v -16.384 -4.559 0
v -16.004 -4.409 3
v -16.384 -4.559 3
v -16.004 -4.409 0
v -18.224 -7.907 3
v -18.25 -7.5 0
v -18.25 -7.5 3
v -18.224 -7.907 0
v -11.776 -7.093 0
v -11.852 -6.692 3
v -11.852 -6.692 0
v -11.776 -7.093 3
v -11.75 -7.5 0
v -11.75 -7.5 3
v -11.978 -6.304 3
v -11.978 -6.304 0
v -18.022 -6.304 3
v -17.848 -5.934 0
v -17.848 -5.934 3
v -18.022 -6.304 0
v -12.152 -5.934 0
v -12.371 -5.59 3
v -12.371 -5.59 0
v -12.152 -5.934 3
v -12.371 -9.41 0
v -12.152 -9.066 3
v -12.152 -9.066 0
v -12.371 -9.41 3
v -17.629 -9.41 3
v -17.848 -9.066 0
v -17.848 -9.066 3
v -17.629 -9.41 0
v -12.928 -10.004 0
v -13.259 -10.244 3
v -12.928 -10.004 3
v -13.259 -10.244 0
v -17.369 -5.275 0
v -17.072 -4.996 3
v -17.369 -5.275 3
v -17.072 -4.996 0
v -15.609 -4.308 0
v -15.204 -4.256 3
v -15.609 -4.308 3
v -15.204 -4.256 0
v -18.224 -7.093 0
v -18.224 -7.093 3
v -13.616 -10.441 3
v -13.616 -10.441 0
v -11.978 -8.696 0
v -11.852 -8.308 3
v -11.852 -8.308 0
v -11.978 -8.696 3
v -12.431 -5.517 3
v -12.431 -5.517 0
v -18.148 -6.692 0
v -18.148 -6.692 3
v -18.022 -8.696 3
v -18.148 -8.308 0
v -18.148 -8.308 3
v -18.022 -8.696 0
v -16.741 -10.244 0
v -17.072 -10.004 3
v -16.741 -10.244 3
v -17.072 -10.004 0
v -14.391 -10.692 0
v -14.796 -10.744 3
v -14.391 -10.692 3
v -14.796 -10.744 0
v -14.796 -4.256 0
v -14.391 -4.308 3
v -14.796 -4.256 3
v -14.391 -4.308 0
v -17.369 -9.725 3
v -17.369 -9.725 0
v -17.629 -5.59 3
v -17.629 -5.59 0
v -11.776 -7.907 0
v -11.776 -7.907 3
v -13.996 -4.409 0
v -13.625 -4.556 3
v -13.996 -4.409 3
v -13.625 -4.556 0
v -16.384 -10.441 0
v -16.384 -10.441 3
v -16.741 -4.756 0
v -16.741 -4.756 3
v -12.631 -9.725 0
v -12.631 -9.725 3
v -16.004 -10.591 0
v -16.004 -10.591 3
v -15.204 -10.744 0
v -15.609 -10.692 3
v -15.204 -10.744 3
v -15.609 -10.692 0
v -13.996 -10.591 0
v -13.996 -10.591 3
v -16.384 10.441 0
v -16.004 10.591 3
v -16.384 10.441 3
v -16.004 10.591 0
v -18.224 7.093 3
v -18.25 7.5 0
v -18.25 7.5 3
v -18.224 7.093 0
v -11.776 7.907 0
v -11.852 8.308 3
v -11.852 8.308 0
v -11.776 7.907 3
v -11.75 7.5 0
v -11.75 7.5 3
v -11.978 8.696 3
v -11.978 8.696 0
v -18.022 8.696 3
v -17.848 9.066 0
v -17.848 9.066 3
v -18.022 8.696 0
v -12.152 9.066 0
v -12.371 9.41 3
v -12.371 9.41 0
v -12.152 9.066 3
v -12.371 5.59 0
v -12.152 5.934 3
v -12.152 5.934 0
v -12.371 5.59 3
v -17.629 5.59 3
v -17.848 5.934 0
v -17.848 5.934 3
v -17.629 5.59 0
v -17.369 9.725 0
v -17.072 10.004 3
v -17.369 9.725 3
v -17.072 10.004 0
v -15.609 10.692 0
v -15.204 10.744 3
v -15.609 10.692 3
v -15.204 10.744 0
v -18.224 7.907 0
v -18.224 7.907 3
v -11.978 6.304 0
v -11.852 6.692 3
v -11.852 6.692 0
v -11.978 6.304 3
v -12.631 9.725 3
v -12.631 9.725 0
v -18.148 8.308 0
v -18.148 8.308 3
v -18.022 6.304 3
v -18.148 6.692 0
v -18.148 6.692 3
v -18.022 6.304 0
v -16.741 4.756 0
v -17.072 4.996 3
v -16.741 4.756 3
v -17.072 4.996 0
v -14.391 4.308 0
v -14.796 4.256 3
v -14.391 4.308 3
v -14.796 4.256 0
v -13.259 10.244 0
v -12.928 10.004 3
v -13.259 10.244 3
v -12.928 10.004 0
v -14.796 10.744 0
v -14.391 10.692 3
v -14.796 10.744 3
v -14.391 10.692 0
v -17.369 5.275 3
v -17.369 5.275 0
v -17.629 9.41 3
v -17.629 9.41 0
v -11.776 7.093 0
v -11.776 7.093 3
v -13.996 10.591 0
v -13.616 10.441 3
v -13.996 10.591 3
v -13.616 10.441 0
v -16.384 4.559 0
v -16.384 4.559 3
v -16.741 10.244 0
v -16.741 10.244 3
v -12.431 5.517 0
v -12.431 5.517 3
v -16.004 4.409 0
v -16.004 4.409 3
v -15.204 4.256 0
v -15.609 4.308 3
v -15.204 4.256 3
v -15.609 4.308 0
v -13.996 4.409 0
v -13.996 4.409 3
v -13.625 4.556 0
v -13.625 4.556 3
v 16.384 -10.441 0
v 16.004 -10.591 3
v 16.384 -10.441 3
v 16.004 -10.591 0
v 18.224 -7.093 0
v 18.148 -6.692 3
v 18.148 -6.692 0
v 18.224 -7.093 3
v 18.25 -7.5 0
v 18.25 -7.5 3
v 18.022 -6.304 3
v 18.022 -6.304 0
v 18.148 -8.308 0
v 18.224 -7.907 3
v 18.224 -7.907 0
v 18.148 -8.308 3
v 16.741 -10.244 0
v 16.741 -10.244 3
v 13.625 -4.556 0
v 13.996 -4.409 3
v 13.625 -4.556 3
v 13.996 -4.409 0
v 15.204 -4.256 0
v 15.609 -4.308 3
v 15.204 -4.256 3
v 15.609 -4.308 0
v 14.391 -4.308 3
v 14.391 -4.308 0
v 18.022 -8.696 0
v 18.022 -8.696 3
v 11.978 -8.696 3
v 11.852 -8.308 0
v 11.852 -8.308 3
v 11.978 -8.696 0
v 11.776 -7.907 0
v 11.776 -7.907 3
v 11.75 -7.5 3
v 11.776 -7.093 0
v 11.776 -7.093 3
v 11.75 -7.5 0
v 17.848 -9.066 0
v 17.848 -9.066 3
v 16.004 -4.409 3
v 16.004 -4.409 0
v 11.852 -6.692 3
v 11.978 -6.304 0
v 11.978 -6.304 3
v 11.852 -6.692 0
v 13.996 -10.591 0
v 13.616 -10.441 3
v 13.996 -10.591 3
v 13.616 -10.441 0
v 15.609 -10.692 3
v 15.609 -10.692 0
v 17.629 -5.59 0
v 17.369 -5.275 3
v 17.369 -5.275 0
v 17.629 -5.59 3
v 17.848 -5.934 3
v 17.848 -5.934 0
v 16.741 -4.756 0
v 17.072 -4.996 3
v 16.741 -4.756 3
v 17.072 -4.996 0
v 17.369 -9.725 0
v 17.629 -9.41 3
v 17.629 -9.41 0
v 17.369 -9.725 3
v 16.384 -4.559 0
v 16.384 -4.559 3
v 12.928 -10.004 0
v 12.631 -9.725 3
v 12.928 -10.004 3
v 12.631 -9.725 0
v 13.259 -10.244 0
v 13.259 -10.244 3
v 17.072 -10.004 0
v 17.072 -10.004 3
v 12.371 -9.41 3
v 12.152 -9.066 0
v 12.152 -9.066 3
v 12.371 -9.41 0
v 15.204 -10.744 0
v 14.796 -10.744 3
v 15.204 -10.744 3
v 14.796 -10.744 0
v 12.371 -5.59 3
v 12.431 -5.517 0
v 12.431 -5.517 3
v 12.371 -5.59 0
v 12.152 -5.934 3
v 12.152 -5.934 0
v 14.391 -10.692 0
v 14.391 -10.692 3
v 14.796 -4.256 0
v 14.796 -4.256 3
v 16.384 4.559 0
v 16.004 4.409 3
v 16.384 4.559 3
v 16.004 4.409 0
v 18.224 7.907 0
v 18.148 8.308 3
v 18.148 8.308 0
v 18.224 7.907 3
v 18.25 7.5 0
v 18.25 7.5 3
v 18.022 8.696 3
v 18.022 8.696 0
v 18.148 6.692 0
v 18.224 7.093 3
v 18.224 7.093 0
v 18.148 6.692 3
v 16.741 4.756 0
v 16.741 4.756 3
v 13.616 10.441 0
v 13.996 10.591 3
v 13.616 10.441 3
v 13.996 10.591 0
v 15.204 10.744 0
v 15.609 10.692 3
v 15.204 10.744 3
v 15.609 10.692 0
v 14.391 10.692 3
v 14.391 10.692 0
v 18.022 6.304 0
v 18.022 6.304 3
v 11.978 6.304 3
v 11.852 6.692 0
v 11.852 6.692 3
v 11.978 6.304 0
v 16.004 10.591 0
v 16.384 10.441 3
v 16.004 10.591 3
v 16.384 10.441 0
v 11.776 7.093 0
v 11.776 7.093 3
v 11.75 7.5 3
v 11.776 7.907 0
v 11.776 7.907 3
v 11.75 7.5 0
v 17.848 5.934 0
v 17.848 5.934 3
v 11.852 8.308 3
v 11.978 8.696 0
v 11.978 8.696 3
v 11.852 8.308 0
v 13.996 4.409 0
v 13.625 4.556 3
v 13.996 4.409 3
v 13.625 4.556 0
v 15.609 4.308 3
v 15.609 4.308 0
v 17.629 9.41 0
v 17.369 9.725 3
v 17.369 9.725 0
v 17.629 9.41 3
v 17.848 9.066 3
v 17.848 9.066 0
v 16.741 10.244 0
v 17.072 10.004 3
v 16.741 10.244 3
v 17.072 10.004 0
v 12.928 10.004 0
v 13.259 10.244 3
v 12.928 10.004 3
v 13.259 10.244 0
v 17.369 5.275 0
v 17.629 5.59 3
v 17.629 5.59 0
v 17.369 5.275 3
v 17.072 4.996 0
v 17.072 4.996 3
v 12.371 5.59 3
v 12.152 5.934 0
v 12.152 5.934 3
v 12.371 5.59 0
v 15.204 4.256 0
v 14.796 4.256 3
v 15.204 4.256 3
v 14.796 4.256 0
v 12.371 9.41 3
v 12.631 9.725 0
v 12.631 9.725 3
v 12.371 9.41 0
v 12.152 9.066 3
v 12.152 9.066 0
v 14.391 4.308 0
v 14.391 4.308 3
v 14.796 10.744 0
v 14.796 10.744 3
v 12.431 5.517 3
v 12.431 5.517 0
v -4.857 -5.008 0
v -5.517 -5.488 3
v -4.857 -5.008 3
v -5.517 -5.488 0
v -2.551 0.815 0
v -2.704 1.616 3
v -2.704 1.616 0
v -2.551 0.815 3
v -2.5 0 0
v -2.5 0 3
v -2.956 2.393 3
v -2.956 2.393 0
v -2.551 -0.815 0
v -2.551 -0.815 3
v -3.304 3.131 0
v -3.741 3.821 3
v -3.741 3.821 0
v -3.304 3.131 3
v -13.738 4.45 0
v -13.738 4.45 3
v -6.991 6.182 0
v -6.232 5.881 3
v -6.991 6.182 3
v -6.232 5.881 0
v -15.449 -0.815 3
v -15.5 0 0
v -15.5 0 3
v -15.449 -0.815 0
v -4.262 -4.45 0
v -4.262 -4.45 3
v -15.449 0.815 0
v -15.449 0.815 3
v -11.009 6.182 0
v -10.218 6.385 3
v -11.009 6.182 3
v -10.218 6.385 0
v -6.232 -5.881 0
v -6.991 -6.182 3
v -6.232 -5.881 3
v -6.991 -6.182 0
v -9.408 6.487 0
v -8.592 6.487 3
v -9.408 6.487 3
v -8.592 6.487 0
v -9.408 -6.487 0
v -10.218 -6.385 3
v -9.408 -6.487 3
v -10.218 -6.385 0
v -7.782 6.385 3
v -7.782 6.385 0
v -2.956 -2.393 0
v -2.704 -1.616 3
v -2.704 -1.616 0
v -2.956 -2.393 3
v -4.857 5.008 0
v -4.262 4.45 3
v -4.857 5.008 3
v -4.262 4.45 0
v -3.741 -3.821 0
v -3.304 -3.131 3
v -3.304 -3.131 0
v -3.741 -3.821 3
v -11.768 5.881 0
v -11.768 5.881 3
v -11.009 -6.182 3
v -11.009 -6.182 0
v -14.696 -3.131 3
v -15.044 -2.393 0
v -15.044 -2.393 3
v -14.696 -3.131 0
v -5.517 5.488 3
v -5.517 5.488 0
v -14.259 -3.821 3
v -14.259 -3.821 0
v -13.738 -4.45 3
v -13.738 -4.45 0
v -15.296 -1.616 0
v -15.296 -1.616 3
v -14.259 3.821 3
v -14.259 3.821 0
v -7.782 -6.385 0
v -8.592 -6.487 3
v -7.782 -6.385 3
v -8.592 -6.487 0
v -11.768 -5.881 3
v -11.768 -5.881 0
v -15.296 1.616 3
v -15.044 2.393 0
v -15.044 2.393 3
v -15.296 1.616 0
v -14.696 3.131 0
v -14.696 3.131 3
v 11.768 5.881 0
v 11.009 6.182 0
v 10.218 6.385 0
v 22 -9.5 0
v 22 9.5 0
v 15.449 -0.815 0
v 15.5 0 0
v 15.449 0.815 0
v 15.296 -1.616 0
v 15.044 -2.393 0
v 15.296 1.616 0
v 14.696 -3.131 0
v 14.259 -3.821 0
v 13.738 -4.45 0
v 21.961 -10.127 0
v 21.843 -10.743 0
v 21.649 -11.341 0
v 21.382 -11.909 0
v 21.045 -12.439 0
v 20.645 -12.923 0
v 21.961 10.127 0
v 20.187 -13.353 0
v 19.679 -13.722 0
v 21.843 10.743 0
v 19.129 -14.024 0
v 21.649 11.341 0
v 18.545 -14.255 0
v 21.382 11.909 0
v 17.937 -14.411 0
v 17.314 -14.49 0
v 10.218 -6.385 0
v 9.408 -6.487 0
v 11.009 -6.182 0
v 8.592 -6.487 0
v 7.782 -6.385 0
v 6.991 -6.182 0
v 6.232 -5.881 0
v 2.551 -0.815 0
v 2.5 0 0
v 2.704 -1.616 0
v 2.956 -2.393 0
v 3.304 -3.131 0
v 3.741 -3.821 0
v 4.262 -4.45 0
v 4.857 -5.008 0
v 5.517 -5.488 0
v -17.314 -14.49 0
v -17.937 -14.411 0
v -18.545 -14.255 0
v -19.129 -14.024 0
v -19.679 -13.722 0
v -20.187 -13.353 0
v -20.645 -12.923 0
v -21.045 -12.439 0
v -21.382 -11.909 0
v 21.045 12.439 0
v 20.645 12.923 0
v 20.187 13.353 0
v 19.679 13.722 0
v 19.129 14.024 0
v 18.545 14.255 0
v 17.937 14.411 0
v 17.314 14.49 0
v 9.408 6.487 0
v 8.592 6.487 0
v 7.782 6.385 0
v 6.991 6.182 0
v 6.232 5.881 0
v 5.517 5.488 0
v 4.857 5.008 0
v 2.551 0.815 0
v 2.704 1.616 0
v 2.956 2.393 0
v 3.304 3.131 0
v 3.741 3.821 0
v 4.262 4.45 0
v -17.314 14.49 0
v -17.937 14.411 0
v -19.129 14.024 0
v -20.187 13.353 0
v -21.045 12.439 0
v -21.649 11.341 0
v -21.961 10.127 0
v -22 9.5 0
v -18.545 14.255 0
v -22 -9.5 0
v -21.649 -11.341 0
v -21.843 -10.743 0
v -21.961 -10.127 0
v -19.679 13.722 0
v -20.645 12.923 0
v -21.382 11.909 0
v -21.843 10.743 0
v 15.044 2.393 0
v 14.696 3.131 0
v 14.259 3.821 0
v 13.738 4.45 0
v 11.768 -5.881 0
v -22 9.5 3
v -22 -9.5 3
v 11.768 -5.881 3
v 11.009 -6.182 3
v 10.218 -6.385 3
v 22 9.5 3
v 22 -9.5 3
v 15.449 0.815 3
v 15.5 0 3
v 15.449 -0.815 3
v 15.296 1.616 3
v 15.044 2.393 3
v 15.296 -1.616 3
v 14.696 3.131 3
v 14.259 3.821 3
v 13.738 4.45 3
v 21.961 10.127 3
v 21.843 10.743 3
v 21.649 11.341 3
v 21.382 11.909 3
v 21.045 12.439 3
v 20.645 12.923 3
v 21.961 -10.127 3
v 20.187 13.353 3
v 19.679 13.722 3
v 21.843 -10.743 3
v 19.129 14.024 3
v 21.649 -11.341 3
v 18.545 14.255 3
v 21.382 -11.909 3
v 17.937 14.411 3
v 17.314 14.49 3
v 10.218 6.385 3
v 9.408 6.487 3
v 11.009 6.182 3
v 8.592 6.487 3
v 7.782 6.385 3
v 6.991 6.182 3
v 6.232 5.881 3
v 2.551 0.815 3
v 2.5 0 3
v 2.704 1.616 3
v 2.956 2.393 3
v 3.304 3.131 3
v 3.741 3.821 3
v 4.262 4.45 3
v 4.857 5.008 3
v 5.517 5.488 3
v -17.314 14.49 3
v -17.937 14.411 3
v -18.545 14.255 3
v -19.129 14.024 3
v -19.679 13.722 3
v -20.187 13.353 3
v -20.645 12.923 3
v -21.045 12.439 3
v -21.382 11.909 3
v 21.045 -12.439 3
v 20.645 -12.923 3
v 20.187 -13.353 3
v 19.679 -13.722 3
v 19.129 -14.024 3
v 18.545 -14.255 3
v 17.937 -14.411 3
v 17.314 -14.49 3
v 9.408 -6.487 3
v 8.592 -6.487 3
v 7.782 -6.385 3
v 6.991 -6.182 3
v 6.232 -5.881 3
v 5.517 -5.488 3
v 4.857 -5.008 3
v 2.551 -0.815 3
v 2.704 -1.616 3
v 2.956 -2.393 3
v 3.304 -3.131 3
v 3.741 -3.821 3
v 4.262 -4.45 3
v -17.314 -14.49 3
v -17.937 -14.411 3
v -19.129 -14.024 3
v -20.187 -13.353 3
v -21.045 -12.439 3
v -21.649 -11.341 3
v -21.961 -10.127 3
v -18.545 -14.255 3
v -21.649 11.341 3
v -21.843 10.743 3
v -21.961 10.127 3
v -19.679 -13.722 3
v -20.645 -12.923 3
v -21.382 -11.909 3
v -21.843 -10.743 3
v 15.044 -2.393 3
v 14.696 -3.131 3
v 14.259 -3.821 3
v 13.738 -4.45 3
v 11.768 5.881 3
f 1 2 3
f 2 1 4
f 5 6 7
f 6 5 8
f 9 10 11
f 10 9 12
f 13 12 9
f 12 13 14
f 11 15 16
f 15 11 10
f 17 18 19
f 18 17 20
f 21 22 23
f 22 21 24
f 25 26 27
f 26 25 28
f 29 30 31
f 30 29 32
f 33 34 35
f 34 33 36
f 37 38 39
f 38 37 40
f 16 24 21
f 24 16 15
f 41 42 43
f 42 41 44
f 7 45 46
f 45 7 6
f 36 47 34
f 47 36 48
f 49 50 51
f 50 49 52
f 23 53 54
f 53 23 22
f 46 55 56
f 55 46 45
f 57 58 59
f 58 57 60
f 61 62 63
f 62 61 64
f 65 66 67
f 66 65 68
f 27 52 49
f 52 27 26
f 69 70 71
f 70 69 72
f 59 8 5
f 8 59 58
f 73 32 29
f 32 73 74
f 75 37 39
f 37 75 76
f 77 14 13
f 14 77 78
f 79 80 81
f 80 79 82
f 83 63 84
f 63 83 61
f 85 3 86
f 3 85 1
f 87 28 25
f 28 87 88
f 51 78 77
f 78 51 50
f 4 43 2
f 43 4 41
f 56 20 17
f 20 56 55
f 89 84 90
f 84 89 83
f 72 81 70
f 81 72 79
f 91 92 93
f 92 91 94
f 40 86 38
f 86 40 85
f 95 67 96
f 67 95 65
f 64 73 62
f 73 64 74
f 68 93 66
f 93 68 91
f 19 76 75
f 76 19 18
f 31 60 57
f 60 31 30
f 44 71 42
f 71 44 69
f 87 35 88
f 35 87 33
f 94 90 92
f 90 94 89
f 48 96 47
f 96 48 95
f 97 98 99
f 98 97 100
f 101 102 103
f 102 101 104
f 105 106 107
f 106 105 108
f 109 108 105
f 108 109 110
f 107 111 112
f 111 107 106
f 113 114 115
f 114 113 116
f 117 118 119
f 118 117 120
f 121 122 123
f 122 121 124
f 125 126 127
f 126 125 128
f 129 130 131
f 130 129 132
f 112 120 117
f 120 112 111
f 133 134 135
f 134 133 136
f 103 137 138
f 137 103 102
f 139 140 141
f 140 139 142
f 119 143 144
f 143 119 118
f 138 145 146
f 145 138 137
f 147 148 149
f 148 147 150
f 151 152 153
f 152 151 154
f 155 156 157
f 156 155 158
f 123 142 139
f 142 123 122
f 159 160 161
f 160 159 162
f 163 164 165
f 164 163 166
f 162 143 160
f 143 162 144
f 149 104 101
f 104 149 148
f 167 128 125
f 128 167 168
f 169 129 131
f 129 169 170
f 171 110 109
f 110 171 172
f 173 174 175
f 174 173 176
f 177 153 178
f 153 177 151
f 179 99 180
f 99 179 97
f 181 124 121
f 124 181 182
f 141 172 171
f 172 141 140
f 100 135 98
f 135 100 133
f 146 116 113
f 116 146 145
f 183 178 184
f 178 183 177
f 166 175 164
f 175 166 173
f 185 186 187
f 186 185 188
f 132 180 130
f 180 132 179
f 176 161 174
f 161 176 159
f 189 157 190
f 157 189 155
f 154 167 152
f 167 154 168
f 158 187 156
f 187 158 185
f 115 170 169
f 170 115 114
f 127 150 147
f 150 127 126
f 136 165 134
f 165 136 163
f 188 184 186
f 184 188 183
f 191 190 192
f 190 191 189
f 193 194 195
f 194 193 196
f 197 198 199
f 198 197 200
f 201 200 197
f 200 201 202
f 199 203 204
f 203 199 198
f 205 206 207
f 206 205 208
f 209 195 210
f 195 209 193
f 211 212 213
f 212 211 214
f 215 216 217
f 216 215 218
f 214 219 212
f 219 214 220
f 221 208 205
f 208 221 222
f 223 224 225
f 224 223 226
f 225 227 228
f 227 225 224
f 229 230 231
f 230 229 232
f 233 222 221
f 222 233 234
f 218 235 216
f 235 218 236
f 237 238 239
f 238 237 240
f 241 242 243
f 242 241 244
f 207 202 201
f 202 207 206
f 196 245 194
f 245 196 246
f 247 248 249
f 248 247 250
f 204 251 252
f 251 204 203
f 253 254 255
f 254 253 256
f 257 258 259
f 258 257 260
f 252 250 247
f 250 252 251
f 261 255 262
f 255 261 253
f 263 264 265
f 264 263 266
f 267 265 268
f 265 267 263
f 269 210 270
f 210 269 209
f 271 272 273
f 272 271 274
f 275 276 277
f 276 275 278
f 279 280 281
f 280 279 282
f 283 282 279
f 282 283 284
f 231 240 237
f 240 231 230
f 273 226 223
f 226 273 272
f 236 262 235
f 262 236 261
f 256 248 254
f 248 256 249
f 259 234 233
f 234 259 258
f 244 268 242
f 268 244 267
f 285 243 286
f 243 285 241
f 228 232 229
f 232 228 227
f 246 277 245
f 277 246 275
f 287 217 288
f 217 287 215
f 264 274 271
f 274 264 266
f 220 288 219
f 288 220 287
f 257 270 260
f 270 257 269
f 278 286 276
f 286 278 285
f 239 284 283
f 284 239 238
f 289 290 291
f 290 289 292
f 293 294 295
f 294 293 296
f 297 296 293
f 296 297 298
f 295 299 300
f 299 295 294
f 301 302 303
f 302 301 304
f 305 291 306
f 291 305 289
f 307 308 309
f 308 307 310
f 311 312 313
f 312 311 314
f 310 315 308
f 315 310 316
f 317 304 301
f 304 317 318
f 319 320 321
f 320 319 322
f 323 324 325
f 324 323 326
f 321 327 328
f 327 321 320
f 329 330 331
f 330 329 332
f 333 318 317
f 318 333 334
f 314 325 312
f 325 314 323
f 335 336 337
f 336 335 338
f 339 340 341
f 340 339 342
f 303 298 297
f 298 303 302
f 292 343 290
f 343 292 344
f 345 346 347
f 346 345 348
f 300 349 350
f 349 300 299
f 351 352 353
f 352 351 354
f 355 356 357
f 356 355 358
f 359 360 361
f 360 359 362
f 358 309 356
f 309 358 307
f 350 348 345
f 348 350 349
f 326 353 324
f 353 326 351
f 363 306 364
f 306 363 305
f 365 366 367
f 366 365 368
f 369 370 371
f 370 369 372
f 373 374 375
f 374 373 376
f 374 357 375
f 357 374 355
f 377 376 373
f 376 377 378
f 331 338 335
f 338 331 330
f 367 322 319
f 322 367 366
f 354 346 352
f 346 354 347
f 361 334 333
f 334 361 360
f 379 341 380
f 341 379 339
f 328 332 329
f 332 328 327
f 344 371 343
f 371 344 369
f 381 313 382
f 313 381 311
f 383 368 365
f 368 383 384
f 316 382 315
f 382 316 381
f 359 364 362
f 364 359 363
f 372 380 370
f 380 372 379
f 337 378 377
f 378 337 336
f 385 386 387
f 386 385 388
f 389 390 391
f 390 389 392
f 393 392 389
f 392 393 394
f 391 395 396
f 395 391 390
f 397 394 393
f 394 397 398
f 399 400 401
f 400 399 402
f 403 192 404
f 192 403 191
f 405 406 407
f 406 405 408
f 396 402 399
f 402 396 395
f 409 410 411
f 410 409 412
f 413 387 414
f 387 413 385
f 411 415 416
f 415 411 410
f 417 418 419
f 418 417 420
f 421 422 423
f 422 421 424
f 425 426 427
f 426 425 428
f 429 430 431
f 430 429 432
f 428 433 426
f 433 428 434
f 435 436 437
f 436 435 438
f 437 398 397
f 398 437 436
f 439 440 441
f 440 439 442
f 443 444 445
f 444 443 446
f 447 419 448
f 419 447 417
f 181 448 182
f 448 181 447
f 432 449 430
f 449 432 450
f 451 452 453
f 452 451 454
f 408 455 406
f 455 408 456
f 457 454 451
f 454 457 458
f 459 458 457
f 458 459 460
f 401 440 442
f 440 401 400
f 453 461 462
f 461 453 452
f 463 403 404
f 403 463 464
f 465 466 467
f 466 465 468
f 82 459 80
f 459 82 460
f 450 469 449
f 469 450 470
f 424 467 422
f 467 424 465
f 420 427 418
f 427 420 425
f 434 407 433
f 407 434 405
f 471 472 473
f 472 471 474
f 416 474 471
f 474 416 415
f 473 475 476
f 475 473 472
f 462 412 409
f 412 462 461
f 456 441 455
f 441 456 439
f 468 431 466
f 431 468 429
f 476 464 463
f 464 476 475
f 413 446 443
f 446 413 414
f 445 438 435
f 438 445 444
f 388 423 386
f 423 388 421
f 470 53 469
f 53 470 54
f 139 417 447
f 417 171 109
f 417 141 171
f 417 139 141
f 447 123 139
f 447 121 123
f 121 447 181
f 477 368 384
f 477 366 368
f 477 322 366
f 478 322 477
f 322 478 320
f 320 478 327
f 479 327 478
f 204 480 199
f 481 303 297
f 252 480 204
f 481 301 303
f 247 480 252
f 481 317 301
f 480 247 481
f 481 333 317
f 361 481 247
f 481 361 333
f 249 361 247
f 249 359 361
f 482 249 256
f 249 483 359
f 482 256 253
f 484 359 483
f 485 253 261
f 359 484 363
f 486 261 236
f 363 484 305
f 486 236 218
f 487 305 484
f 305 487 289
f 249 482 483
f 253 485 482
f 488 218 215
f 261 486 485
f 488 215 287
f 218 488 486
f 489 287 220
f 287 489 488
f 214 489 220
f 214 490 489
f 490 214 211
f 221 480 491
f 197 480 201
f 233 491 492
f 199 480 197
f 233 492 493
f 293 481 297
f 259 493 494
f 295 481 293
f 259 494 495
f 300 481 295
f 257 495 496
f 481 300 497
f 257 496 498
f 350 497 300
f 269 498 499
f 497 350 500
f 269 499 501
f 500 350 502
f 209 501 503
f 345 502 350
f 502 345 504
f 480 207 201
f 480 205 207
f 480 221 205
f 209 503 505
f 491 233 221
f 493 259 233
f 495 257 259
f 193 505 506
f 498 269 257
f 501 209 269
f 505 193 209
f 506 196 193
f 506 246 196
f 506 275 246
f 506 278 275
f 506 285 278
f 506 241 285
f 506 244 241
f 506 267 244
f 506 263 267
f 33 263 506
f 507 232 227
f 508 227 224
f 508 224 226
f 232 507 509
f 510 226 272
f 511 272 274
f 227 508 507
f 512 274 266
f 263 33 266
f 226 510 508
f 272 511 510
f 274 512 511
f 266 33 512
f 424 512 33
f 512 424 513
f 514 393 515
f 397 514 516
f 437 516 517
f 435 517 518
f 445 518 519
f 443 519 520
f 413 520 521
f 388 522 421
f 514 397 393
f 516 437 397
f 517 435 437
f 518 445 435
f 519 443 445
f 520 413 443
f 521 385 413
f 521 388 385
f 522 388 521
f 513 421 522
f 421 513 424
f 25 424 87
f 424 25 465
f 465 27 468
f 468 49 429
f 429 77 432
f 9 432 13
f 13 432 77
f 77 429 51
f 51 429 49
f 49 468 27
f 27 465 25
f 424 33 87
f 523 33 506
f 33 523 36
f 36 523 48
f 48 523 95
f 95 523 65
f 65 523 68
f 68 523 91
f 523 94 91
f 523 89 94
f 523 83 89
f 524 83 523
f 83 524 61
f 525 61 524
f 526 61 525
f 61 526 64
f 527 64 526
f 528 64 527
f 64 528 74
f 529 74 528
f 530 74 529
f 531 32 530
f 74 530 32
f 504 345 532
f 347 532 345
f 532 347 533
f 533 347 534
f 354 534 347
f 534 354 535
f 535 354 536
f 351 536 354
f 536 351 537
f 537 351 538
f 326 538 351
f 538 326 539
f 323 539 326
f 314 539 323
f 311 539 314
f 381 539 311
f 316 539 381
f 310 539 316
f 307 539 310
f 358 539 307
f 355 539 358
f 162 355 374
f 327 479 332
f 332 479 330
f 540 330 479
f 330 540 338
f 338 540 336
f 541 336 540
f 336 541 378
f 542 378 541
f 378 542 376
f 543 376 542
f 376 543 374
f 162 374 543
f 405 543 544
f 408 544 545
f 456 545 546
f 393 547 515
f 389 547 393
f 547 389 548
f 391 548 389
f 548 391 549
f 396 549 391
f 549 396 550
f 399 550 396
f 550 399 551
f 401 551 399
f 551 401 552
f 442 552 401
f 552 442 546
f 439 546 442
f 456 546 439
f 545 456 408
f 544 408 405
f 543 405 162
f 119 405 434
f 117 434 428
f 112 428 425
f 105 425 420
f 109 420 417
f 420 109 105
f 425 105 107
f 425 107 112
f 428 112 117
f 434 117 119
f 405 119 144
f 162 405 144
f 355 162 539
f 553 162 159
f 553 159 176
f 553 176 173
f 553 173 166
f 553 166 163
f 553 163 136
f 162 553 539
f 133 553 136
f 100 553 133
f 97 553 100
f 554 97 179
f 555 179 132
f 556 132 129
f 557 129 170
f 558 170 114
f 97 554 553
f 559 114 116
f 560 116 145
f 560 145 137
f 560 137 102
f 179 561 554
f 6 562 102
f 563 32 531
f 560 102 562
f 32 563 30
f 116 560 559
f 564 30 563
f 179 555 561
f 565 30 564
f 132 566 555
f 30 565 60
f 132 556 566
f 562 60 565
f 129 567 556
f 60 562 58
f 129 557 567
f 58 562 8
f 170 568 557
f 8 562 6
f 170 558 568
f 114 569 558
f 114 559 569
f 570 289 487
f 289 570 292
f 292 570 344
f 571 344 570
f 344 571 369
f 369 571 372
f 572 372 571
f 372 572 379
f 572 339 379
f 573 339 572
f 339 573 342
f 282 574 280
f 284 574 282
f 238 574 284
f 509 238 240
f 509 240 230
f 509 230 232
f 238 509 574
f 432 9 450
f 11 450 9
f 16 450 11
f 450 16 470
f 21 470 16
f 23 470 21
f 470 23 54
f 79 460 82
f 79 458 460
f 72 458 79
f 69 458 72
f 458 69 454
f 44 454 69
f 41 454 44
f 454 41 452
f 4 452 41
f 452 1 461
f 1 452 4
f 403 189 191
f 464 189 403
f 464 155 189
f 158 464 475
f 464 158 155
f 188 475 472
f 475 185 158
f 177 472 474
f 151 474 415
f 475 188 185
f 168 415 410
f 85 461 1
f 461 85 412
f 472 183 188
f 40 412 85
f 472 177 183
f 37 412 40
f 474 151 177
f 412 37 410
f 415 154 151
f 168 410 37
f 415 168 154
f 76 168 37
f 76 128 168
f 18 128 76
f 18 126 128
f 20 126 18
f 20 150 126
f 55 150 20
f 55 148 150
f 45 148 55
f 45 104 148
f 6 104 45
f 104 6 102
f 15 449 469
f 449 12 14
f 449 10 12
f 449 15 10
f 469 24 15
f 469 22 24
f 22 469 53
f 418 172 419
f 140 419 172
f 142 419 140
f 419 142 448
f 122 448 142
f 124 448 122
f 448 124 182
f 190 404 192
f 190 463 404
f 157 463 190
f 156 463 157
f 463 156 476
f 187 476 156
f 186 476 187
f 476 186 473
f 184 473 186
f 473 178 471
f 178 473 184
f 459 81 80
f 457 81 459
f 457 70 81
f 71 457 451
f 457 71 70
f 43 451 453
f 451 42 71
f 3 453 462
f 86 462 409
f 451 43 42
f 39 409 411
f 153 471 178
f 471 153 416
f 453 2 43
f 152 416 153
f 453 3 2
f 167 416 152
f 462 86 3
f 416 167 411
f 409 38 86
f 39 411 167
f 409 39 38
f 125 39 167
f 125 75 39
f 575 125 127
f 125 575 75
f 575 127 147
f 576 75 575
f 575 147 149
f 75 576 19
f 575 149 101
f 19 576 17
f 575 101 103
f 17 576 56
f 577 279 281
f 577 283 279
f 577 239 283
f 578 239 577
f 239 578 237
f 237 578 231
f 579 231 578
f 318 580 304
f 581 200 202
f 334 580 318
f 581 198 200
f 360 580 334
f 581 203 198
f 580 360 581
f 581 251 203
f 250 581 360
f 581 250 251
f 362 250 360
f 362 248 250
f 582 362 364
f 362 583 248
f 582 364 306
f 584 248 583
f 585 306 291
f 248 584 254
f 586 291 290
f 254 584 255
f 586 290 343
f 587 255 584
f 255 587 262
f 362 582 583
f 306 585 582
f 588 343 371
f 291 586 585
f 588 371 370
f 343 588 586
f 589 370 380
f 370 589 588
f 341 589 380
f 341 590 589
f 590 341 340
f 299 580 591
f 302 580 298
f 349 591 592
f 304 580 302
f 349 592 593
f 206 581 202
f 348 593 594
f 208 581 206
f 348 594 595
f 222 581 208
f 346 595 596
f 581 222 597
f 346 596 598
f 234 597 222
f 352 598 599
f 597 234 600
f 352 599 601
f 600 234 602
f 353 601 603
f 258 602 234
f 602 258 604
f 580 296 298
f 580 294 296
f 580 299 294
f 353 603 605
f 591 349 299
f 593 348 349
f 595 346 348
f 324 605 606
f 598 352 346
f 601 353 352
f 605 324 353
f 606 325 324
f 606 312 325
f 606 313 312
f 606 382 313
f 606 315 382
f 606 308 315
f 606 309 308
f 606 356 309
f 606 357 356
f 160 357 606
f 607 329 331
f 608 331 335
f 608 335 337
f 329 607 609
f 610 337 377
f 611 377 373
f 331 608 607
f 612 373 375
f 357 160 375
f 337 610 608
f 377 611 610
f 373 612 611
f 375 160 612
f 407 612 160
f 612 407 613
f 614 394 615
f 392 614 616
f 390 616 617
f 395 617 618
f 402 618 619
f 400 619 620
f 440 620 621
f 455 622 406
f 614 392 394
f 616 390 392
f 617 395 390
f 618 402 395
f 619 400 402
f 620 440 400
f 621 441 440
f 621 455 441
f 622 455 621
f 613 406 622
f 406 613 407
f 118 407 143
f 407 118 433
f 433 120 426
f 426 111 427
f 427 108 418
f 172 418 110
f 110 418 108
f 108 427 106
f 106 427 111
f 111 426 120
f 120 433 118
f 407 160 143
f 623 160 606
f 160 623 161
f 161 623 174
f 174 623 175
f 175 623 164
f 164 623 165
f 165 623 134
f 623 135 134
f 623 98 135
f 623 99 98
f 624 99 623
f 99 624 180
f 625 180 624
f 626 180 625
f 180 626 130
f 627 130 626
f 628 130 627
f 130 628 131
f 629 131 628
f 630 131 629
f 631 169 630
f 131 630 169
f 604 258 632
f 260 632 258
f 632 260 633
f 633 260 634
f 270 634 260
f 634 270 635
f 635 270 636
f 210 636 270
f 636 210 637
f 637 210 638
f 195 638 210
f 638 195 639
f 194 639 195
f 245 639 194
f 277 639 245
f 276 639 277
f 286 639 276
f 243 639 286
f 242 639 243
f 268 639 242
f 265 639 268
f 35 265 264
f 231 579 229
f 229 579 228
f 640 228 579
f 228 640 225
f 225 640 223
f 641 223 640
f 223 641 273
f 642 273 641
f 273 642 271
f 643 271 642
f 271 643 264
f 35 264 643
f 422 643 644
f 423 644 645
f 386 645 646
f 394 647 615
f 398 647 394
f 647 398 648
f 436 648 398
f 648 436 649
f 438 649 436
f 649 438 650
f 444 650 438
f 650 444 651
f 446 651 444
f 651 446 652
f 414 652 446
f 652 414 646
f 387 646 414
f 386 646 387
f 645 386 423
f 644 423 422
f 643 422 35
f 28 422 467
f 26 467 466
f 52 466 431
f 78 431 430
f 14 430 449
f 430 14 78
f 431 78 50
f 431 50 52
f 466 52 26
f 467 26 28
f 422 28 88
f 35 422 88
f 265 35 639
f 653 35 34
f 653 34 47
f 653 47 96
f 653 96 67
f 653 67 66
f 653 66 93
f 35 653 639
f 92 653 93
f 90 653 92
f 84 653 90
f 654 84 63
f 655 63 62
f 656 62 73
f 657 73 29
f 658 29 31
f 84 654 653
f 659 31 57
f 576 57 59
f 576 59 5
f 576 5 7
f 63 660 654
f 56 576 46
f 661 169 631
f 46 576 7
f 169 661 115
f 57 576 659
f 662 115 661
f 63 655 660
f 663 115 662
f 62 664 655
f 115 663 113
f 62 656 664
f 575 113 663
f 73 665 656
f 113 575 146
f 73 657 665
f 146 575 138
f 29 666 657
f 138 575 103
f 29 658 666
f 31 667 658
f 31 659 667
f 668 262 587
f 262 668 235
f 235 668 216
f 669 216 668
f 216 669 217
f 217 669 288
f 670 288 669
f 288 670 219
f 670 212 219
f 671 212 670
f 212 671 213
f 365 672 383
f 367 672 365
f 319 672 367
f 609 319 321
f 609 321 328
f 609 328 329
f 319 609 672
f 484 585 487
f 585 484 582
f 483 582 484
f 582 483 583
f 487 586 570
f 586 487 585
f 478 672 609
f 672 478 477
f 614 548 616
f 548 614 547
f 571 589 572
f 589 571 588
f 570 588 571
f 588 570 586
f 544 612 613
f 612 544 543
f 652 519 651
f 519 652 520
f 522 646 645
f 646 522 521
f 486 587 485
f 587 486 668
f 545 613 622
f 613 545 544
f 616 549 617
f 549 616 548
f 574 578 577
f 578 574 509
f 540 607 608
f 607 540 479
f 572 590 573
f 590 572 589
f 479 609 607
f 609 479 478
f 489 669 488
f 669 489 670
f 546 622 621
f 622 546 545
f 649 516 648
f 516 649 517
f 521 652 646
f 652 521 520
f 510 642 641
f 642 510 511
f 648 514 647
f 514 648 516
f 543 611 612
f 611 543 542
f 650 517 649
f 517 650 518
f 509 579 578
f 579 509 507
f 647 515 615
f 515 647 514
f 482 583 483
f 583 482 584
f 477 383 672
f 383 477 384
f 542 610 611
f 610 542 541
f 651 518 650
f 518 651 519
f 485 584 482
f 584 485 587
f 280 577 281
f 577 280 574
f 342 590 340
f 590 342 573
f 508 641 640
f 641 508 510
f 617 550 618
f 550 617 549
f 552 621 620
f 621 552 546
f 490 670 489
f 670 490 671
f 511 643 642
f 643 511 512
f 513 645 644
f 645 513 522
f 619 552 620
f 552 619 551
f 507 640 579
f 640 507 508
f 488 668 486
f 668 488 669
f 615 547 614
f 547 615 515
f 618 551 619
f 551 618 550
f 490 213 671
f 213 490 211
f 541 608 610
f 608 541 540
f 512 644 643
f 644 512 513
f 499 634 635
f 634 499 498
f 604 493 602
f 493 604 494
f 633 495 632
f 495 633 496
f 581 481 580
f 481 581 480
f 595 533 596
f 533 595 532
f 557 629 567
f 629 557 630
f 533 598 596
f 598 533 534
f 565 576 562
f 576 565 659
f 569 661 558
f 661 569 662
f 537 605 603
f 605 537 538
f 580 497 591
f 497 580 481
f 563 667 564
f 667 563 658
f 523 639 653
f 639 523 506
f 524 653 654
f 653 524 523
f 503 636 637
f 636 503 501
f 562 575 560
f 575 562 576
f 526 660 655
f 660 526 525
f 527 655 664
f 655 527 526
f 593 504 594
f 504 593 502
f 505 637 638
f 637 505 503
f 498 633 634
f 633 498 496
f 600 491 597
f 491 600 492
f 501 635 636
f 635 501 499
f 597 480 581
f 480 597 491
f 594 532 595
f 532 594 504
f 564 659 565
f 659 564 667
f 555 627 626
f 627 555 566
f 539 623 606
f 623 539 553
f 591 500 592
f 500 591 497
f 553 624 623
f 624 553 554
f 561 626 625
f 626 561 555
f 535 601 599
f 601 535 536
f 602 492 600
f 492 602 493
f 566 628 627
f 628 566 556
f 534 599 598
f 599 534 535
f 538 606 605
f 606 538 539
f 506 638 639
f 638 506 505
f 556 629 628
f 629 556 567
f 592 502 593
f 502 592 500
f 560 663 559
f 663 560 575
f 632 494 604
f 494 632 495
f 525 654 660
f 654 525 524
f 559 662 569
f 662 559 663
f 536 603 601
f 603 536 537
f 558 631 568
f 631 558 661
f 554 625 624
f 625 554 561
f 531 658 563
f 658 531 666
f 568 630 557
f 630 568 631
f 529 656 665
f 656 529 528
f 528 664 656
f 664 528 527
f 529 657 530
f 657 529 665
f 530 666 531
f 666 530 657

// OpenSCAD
$fn = 50;

difference() {
	union() {
		hull() {
			translate(v = [-17.0, 9.5, 0]) {
				cylinder(h = 3, r = 5);
			}
			translate(v = [17.0, 9.5, 0]) {
				cylinder(h = 3, r = 5);
			}
			translate(v = [-17.0, -9.5, 0]) {
				cylinder(h = 3, r = 5);
			}
			translate(v = [17.0, -9.5, 0]) {
				cylinder(h = 3, r = 5);
			}
		}
	}
	union() {
		translate(v = [-15.0, -7.5, -100.0]) {
			cylinder(h = 200, r = 3.25);
		}
		translate(v = [-15.0, 7.5, -100.0]) {
			cylinder(h = 200, r = 3.25);
		}
		translate(v = [15.0, -7.5, -100.0]) {
			cylinder(h = 200, r = 3.25);
		}
		translate(v = [15.0, 7.5, -100.0]) {
			cylinder(h = 200, r = 3.25);
		}
		translate(v = [-15.0, -7.5, -100.0]) {
			cylinder(h = 200, r = 1.8);
		}
		translate(v = [-15.0, 7.5, -100.0]) {
			cylinder(h = 200, r = 1.8);
		}
		translate(v = [15.0, -7.5, -100.0]) {
			cylinder(h = 200, r = 1.8);
		}
		translate(v = [15.0, 7.5, -100.0]) {
			cylinder(h = 200, r = 1.8);
		}
		translate(v = [-9.0, 0, 0.0]) {
			cylinder(h = 3, r = 6.5);
		}
		translate(v = [9.0, 0, 0.0]) {
			cylinder(h = 3, r = 6.5);
		}
	}
}
